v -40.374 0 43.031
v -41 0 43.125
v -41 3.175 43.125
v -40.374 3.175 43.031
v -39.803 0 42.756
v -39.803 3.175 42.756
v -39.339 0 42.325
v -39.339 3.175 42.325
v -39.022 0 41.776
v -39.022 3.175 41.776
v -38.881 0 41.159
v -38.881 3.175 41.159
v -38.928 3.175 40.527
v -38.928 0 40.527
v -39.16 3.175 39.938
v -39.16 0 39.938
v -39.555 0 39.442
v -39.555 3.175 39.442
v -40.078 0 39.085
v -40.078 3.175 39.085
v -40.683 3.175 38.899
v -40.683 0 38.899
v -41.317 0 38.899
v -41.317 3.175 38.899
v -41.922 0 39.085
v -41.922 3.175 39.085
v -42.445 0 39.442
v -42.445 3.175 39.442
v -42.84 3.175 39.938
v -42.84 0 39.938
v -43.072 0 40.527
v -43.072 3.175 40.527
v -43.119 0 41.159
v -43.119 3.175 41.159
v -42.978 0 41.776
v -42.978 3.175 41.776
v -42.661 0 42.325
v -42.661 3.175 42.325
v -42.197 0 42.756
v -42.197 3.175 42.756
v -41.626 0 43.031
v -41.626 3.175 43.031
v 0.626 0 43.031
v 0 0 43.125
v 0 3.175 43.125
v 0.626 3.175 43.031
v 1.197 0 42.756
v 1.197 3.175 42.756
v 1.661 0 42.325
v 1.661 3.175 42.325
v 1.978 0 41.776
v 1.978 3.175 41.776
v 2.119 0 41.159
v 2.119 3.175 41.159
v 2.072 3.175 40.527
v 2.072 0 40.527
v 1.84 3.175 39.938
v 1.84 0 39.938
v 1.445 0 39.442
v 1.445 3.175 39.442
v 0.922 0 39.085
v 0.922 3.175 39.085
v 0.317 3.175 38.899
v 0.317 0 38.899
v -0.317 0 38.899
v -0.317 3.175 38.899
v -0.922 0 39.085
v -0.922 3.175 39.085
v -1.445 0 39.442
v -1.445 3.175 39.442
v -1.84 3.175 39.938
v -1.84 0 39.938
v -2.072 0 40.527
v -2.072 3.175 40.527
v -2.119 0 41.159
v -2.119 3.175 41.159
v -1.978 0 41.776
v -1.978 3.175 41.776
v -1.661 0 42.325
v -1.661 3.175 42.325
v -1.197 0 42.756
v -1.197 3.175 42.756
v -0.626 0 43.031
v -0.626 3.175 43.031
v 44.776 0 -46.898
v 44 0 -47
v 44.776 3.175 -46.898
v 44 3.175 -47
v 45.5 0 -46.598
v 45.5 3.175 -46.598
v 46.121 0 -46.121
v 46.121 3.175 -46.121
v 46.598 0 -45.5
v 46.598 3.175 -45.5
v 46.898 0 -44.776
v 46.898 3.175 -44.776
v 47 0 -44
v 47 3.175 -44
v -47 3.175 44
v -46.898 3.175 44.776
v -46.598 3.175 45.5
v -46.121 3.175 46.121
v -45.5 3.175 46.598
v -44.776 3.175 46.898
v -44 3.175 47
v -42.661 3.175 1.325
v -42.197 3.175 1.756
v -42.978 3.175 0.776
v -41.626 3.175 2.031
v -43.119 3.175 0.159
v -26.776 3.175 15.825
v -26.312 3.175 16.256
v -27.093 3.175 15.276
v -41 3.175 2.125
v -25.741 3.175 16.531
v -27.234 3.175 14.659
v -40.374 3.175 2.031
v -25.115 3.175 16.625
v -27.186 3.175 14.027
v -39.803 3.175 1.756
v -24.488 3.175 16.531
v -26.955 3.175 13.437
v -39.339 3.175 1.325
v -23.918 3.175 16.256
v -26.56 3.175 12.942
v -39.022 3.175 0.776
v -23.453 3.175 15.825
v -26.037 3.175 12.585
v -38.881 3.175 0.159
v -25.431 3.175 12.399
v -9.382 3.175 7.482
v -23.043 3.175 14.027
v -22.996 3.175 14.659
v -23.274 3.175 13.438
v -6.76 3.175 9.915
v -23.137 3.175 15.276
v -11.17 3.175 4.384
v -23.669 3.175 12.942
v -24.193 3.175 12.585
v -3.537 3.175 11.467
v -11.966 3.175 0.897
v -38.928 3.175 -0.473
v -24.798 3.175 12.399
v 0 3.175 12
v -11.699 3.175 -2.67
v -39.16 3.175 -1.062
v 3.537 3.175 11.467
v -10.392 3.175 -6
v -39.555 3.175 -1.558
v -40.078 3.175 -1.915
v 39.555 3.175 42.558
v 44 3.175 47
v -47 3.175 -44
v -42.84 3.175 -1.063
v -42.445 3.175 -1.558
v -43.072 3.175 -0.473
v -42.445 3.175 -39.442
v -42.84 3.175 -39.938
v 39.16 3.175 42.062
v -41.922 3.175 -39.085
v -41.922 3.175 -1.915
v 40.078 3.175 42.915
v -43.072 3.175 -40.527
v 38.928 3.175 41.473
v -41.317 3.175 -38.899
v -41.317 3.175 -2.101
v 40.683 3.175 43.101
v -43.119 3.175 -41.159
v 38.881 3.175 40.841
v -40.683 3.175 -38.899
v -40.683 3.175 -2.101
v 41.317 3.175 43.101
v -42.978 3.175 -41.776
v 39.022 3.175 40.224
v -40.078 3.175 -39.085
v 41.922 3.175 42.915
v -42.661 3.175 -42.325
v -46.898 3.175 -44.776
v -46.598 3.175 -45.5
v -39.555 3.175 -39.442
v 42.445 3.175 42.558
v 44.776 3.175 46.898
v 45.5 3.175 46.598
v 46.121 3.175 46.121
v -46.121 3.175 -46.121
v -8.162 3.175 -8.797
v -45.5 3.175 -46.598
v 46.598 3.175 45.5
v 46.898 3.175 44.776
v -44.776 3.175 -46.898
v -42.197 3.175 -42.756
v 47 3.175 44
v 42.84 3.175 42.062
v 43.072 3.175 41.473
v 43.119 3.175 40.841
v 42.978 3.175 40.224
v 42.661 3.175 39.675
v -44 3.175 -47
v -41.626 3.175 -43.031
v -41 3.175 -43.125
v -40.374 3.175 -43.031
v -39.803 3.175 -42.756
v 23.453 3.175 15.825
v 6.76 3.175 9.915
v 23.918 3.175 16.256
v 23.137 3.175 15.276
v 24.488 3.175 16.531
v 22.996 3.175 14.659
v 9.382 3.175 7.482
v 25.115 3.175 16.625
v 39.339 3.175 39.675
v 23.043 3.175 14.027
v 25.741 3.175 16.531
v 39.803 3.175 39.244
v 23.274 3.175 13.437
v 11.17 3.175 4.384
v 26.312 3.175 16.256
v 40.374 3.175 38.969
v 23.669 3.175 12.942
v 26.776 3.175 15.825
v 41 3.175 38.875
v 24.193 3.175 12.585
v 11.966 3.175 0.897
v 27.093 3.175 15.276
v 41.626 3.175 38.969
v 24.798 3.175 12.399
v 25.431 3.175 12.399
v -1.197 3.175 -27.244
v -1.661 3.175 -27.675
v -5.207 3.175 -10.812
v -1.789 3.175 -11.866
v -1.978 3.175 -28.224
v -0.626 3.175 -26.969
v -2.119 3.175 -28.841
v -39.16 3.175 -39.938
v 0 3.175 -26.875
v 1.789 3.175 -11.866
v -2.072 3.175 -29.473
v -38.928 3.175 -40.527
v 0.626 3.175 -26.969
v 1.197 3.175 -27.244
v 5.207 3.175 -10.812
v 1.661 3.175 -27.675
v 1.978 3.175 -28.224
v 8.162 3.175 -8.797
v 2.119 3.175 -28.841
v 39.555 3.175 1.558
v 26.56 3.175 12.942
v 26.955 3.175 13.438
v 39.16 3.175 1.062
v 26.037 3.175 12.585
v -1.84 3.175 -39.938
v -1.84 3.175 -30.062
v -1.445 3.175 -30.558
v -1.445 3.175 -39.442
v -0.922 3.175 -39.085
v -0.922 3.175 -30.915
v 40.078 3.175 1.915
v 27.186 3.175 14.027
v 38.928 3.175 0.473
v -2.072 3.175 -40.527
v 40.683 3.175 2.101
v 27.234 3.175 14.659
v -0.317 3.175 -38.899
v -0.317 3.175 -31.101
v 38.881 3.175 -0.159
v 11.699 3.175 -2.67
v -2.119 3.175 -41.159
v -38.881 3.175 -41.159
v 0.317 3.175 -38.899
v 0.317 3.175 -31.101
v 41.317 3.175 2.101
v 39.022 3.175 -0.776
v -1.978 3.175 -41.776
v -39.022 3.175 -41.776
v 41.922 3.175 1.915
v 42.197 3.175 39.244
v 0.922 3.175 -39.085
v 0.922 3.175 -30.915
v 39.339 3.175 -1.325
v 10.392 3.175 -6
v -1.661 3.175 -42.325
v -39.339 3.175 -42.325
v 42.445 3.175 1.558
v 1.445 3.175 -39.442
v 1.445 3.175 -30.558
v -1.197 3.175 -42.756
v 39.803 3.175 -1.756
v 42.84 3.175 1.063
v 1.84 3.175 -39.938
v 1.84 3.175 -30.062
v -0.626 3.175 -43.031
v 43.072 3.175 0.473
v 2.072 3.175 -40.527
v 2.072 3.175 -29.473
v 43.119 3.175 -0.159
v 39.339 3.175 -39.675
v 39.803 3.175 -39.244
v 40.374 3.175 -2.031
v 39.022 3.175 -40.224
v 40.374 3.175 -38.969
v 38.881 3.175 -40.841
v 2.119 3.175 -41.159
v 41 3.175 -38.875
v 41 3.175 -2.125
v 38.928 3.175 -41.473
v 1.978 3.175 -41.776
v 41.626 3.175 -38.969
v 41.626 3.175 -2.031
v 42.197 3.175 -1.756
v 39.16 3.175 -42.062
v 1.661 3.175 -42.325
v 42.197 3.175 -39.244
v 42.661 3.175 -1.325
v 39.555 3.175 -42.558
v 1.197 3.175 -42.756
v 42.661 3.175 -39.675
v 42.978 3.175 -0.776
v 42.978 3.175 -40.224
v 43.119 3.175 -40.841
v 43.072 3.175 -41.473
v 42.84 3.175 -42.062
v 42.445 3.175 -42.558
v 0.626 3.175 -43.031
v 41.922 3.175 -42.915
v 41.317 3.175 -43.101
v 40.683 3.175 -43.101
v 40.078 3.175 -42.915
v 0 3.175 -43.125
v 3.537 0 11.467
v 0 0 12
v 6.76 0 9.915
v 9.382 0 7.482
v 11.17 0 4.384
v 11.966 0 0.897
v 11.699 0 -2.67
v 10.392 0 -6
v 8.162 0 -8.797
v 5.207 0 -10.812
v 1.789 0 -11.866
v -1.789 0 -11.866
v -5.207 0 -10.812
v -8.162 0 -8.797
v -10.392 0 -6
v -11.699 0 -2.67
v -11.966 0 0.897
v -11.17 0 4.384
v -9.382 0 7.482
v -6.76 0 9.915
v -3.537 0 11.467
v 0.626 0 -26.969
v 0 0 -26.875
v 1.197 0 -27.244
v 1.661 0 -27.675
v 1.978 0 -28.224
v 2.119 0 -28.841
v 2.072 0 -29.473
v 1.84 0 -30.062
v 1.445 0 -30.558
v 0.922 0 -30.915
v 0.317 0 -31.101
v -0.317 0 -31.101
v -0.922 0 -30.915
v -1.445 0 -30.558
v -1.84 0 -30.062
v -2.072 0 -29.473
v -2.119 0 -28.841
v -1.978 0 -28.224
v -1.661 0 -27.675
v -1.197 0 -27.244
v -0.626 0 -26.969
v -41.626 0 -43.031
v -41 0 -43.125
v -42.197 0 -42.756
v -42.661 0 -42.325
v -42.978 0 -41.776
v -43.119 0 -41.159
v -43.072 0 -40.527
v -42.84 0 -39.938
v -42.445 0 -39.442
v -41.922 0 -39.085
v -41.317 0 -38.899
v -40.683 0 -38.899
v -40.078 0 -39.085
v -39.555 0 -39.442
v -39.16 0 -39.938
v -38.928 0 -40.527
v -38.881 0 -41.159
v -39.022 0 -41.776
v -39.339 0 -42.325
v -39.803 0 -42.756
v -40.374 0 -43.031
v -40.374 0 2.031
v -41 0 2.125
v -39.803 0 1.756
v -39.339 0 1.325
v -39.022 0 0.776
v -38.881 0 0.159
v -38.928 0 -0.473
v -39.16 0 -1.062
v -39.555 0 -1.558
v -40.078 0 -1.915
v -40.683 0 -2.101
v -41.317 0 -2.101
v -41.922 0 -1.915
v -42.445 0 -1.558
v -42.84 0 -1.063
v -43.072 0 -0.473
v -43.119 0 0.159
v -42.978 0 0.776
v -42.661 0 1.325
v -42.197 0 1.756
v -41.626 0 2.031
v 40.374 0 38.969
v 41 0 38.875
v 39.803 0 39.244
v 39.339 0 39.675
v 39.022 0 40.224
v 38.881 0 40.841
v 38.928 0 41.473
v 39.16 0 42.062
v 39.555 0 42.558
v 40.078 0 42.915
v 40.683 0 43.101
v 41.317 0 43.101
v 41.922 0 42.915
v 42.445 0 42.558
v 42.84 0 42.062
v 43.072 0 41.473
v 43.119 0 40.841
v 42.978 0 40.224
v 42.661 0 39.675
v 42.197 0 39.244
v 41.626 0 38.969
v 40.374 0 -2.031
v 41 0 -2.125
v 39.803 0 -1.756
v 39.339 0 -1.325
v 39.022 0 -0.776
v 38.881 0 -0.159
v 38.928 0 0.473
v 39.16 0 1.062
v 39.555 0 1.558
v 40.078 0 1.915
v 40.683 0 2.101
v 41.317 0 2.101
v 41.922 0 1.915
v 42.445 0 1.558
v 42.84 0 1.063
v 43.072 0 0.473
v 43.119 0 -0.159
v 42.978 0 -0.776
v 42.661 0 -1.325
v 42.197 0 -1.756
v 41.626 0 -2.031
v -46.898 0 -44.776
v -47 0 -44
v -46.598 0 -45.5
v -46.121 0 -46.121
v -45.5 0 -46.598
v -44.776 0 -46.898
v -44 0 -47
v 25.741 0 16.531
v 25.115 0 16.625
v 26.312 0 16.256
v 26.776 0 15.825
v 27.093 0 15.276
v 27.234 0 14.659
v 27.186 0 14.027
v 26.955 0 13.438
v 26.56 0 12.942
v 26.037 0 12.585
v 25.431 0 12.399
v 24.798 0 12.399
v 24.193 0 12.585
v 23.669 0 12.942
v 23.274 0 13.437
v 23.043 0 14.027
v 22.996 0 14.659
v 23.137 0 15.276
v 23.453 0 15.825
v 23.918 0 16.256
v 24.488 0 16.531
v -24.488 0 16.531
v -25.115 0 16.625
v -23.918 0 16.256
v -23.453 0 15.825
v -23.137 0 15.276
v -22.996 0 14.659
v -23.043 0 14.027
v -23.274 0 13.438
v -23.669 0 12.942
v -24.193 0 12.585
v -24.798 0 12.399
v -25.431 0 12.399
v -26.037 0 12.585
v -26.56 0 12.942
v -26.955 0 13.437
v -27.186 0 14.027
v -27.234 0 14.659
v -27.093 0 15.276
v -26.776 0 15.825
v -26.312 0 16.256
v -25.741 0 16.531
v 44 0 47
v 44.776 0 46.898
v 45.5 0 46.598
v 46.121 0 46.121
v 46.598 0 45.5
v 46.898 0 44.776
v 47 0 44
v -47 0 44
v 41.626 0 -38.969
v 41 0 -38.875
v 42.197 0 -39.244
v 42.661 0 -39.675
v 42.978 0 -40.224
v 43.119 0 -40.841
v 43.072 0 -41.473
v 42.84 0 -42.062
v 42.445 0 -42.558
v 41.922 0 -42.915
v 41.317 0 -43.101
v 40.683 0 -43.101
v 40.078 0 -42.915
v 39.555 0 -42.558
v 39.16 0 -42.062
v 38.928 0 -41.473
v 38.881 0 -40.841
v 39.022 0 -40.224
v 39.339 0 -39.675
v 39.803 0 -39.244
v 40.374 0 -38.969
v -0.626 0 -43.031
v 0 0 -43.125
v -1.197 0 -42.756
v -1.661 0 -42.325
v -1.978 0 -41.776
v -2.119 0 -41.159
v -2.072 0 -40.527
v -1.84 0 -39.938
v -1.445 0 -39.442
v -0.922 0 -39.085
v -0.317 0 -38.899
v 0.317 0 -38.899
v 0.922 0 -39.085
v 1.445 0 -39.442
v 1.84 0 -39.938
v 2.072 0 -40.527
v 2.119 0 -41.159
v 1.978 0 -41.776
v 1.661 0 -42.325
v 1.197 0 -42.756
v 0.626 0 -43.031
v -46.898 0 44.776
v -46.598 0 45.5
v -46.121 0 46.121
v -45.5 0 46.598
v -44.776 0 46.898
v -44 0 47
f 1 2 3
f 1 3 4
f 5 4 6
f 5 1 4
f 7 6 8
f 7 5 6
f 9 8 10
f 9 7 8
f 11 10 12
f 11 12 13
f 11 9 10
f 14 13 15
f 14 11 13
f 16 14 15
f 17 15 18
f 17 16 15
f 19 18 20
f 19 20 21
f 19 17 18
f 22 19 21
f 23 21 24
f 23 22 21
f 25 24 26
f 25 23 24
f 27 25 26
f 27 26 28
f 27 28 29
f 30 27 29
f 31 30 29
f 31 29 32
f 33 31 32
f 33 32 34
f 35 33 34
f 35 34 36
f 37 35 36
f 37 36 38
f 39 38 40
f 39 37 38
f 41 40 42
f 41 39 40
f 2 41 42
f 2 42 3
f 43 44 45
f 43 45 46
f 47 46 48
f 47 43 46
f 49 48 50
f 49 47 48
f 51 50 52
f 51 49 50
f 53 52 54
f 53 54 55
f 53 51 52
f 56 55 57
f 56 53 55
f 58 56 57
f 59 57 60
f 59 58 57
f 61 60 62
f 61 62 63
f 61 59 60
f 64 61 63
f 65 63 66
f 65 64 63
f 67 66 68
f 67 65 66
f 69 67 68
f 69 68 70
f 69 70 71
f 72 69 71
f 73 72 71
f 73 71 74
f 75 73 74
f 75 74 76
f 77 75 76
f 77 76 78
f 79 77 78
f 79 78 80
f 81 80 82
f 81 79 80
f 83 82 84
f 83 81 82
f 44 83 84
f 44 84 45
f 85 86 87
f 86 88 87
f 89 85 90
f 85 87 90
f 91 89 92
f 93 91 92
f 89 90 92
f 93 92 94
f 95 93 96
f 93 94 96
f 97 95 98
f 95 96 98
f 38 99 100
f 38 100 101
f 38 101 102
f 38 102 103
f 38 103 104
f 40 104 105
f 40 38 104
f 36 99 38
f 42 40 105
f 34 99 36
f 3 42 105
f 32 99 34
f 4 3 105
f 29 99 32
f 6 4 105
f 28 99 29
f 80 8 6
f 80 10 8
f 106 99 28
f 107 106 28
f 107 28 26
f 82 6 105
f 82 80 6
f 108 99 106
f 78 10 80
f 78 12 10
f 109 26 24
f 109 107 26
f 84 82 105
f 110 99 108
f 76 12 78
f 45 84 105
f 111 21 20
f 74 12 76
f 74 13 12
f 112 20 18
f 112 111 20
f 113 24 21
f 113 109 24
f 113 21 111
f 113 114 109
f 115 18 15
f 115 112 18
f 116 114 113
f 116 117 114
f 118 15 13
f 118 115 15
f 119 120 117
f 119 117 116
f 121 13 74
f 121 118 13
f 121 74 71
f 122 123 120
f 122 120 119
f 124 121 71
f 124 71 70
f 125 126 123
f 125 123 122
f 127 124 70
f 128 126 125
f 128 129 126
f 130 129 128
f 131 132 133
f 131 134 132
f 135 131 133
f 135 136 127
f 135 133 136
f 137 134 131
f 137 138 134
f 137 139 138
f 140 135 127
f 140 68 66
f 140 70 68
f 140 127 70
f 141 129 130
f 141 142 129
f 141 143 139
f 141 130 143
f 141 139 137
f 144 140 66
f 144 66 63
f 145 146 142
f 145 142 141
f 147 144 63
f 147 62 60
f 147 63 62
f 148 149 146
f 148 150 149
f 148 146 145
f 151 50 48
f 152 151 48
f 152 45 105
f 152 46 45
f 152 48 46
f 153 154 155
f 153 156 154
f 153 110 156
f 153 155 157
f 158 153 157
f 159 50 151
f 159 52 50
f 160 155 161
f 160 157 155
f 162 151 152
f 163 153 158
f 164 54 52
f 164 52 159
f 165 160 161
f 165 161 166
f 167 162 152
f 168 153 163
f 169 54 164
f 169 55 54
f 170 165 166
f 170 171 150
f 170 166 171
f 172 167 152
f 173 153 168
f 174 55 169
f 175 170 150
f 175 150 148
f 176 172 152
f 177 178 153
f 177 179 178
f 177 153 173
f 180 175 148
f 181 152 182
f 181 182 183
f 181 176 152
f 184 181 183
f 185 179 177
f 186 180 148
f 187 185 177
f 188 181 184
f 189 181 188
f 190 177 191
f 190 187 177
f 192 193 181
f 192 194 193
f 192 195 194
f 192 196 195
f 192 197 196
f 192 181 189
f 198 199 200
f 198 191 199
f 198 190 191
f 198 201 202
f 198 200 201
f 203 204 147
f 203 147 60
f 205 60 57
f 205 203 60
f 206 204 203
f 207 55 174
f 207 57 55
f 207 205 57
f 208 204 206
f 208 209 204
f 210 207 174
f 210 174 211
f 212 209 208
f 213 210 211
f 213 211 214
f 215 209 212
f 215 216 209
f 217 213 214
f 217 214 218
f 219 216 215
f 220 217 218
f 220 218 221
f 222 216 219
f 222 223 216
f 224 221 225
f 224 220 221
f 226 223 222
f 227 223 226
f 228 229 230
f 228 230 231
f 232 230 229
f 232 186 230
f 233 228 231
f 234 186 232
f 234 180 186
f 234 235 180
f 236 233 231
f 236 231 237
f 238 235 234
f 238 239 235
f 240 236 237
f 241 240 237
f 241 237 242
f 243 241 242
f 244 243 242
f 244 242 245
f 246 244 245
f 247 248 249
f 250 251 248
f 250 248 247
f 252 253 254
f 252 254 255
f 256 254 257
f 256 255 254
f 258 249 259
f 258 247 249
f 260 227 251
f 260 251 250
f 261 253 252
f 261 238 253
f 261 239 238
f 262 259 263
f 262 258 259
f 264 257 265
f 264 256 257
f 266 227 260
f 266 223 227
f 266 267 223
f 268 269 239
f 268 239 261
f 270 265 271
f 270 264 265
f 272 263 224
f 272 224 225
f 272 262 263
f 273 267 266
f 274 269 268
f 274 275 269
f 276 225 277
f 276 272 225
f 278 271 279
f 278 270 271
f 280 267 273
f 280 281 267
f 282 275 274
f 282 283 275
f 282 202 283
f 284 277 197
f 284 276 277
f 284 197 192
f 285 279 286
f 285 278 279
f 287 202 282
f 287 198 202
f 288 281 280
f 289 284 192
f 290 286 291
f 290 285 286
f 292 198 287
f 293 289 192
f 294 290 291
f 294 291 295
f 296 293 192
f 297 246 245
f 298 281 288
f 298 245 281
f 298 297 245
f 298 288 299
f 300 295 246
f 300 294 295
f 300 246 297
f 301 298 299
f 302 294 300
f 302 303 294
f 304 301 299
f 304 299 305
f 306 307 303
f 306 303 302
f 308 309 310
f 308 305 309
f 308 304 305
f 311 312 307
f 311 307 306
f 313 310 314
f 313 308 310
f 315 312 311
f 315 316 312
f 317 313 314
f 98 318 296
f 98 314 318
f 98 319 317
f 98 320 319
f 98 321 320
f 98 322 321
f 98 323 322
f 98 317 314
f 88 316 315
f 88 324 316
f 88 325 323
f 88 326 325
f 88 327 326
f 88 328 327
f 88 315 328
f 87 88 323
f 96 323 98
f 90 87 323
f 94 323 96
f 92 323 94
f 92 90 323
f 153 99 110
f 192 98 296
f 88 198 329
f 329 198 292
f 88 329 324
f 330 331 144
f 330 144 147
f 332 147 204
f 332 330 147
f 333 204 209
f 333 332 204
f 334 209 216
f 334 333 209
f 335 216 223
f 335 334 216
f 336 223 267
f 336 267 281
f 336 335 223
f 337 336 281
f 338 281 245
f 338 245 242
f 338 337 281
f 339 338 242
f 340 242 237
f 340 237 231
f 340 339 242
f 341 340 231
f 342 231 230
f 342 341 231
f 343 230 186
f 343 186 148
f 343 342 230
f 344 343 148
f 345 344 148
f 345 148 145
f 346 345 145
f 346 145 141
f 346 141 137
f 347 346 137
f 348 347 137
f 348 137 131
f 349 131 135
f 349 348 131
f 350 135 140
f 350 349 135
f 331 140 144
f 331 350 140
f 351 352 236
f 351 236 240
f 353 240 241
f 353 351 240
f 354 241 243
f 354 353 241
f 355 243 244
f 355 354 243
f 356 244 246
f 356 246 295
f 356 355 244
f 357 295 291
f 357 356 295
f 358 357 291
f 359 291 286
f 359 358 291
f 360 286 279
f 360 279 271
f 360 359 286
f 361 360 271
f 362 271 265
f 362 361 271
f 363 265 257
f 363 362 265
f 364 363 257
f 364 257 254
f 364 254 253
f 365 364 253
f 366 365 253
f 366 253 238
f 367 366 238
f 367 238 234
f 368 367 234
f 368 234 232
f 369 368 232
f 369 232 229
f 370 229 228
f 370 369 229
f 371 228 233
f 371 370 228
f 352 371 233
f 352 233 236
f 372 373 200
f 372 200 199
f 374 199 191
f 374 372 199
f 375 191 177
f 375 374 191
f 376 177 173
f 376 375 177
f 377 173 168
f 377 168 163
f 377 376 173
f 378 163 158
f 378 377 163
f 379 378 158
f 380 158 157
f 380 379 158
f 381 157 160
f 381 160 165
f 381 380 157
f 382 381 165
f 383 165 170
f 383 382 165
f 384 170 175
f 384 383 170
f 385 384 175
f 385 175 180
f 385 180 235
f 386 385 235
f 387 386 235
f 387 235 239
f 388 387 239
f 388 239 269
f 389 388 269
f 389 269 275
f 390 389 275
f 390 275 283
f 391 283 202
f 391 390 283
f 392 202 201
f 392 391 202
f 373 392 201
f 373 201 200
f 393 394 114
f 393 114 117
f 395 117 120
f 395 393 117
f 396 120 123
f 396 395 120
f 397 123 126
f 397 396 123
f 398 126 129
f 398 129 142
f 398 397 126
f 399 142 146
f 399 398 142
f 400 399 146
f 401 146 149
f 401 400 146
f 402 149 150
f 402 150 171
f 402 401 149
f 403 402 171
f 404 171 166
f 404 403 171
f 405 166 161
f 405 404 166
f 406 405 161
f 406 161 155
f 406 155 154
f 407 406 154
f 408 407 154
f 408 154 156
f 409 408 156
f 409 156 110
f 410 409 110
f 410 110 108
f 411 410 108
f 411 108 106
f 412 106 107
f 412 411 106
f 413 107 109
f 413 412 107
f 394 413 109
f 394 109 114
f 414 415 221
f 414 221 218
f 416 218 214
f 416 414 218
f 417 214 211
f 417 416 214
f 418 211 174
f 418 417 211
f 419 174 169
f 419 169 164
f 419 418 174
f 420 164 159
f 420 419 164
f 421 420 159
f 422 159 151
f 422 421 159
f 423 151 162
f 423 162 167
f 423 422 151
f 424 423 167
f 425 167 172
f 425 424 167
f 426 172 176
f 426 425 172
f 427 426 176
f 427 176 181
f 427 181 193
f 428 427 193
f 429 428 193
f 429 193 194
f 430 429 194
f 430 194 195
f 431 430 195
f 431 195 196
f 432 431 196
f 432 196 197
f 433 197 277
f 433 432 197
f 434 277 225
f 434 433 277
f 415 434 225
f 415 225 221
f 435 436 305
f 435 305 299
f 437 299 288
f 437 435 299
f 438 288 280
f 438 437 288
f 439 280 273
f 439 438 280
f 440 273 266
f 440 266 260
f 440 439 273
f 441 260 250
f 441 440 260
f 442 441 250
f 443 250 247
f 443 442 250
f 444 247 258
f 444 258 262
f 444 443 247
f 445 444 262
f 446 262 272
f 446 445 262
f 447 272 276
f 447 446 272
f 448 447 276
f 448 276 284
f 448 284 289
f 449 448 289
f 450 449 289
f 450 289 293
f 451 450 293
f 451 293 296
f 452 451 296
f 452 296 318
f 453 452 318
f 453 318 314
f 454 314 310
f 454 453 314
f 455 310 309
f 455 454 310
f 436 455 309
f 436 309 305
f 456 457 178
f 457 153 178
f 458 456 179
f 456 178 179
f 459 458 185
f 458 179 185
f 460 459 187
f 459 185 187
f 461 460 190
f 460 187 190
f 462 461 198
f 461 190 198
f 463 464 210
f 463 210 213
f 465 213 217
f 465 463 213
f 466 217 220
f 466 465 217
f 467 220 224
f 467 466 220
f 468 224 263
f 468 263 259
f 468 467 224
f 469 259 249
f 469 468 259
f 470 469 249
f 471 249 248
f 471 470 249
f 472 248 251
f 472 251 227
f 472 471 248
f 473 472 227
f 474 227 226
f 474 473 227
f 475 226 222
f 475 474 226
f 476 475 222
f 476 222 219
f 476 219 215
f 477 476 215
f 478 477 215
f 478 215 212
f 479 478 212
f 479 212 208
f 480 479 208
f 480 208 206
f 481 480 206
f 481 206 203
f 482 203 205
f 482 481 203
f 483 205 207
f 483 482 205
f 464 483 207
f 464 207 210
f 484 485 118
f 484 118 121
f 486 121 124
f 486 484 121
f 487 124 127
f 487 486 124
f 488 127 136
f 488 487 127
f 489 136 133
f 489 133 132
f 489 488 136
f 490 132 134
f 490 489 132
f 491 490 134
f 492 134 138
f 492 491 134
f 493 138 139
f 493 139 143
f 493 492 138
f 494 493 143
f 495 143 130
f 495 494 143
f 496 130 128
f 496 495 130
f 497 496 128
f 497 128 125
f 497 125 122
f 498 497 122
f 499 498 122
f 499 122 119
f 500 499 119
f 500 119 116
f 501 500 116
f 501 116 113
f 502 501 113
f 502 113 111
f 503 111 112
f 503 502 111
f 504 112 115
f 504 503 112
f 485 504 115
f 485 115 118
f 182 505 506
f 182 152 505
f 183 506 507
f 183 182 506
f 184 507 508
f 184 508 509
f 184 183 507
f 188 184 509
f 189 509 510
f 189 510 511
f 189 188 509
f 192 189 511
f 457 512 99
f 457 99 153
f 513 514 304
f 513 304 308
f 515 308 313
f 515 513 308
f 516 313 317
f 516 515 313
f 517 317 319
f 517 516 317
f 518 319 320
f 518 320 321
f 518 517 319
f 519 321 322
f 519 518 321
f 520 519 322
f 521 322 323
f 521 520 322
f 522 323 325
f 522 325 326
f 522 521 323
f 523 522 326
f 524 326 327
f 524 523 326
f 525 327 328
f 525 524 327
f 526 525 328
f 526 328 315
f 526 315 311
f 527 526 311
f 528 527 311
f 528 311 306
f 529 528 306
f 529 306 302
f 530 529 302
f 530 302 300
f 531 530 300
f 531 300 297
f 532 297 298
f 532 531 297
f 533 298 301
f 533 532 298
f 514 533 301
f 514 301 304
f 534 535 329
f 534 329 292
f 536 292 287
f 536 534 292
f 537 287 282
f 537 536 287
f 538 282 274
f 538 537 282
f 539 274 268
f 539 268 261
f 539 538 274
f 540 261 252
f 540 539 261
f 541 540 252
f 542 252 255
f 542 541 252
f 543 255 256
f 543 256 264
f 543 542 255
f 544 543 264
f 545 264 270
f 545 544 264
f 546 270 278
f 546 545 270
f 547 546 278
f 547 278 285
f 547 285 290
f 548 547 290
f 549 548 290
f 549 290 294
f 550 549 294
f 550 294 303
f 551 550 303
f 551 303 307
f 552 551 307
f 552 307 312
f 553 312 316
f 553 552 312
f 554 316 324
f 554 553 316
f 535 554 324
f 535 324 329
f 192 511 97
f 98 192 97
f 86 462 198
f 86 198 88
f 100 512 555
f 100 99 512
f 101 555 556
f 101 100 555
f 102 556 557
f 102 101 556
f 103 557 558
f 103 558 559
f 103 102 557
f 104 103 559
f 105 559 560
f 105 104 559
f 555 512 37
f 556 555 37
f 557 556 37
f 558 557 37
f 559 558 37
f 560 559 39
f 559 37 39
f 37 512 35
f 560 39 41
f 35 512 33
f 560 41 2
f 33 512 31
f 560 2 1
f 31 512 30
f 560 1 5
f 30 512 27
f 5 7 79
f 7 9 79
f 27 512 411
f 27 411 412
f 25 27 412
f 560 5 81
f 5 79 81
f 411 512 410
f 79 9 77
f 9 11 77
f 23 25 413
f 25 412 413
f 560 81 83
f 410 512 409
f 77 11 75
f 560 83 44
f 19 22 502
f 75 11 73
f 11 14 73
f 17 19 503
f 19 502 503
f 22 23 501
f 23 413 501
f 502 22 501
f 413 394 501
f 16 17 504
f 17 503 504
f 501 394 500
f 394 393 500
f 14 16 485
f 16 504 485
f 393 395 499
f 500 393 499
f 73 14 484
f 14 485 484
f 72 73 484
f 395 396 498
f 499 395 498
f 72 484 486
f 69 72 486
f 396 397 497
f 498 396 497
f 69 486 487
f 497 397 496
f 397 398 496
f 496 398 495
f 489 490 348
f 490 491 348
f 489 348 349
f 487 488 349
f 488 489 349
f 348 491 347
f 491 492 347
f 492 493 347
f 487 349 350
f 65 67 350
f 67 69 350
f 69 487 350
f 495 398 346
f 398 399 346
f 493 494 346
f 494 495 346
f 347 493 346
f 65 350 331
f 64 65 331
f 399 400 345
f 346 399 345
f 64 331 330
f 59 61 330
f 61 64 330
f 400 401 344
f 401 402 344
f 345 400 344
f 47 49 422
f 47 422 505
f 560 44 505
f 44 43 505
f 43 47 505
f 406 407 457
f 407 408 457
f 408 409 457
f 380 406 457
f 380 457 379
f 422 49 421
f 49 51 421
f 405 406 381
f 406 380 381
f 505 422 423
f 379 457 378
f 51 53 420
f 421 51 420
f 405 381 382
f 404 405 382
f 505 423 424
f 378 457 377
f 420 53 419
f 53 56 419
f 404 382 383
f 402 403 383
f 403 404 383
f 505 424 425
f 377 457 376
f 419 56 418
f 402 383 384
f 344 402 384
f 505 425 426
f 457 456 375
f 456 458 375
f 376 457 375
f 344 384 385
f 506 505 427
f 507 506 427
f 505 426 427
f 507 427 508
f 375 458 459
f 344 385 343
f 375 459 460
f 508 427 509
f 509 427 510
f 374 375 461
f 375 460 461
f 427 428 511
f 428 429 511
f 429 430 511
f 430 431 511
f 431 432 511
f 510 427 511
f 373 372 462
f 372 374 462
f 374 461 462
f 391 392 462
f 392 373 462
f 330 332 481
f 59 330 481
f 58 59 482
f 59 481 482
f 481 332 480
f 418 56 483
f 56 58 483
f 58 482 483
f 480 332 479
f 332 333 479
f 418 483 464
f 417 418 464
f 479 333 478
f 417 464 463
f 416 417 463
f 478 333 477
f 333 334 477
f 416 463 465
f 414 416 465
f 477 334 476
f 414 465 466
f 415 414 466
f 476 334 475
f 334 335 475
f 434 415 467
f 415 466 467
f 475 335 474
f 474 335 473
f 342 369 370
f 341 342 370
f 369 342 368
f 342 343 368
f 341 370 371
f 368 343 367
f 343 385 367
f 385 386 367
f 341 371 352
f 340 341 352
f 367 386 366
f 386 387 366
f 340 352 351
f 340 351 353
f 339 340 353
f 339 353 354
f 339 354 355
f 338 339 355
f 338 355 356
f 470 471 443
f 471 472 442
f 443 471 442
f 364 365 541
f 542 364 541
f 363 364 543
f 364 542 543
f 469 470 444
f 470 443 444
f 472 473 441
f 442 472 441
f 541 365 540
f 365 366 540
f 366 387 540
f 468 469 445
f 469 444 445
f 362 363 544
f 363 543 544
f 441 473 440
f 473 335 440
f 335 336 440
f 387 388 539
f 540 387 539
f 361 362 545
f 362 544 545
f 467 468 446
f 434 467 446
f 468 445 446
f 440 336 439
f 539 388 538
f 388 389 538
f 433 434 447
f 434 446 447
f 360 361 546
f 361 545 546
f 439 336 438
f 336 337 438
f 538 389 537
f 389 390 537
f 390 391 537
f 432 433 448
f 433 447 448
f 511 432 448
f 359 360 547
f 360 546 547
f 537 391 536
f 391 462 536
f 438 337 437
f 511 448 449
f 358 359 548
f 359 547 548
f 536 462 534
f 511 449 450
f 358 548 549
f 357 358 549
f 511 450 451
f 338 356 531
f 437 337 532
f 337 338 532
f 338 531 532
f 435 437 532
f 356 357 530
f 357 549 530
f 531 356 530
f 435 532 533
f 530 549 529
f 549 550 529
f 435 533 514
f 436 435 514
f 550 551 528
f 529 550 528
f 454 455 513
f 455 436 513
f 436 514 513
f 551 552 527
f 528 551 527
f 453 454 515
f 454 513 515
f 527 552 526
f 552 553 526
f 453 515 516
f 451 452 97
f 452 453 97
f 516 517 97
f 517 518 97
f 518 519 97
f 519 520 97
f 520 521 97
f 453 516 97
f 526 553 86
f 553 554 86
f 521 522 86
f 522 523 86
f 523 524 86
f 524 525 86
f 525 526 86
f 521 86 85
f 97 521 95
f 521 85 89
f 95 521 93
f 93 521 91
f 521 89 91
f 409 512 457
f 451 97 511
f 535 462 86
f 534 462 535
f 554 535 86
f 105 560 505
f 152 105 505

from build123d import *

# Parameters (mm, degrees)
SKETCH1_W           = 94
SKETCH1_H           = 94
SKETCH1_R           = 12
SKETCH1_R_2         = 2.125
BOSS_EXTRUDE1_DEPTH = 3.175
FILLET1_R           = 3


with BuildPart() as part:
    # Sketch1 → Boss-Extrude1 (new body)
    with BuildSketch(Plane(origin=(0, 0, 0), x_dir=(1, 0, 0), z_dir=(0, 1, 0))):
        Rectangle(SKETCH1_W, SKETCH1_H)
        with Locations(Location((0, 0, 0), (0, 0, 270))):
            Circle(SKETCH1_R, mode=Mode.SUBTRACT)
        with Locations(Location((0, 29, 0), (0, 0, 270))):
            Circle(SKETCH1_R_2, mode=Mode.SUBTRACT)
        with Locations(Location((25.11473671, -14.5, 0), (0, 0, 270))):
            Circle(SKETCH1_R_2, mode=Mode.SUBTRACT)
        with Locations(Location((-25.11473671, -14.5, 0), (0, 0, 270))):
            Circle(SKETCH1_R_2, mode=Mode.SUBTRACT)
        with Locations(Location((-41, -41, 0), (0, 0, 270))):
            Circle(SKETCH1_R_2, mode=Mode.SUBTRACT)
        with Locations(Location((-41, 0, 0), (0, 0, 270))):
            Circle(SKETCH1_R_2, mode=Mode.SUBTRACT)
        with Locations(Location((-41, 41, 0), (0, 0, 90))):
            Circle(SKETCH1_R_2, mode=Mode.SUBTRACT)
        with Locations(Location((41, -41, 0), (0, 0, 90))):
            Circle(SKETCH1_R_2, mode=Mode.SUBTRACT)
        with Locations(Location((41, 0, 0), (0, 0, 90))):
            Circle(SKETCH1_R_2, mode=Mode.SUBTRACT)
        with Locations(Location((41, 41, 0), (0, 0, 270))):
            Circle(SKETCH1_R_2, mode=Mode.SUBTRACT)
        with Locations(Location((0, -41, 0), (0, 0, 270))):
            Circle(SKETCH1_R_2, mode=Mode.SUBTRACT)
        with Locations(Location((0, 41, 0), (0, 0, 90))):
            Circle(SKETCH1_R_2, mode=Mode.SUBTRACT)
    extrude(amount=BOSS_EXTRUDE1_DEPTH)

    # Fillet1
    fillet1_edges = [part.edges().sort_by_distance(p)[0] for p in [
        (47, 1.5875, 47),
        (-47, 1.5875, 47),
        (-47, 1.5875, -47),
        (47, 1.5875, -47),
    ]]
    fillet(fillet1_edges, radius=FILLET1_R)


solid = part.part
